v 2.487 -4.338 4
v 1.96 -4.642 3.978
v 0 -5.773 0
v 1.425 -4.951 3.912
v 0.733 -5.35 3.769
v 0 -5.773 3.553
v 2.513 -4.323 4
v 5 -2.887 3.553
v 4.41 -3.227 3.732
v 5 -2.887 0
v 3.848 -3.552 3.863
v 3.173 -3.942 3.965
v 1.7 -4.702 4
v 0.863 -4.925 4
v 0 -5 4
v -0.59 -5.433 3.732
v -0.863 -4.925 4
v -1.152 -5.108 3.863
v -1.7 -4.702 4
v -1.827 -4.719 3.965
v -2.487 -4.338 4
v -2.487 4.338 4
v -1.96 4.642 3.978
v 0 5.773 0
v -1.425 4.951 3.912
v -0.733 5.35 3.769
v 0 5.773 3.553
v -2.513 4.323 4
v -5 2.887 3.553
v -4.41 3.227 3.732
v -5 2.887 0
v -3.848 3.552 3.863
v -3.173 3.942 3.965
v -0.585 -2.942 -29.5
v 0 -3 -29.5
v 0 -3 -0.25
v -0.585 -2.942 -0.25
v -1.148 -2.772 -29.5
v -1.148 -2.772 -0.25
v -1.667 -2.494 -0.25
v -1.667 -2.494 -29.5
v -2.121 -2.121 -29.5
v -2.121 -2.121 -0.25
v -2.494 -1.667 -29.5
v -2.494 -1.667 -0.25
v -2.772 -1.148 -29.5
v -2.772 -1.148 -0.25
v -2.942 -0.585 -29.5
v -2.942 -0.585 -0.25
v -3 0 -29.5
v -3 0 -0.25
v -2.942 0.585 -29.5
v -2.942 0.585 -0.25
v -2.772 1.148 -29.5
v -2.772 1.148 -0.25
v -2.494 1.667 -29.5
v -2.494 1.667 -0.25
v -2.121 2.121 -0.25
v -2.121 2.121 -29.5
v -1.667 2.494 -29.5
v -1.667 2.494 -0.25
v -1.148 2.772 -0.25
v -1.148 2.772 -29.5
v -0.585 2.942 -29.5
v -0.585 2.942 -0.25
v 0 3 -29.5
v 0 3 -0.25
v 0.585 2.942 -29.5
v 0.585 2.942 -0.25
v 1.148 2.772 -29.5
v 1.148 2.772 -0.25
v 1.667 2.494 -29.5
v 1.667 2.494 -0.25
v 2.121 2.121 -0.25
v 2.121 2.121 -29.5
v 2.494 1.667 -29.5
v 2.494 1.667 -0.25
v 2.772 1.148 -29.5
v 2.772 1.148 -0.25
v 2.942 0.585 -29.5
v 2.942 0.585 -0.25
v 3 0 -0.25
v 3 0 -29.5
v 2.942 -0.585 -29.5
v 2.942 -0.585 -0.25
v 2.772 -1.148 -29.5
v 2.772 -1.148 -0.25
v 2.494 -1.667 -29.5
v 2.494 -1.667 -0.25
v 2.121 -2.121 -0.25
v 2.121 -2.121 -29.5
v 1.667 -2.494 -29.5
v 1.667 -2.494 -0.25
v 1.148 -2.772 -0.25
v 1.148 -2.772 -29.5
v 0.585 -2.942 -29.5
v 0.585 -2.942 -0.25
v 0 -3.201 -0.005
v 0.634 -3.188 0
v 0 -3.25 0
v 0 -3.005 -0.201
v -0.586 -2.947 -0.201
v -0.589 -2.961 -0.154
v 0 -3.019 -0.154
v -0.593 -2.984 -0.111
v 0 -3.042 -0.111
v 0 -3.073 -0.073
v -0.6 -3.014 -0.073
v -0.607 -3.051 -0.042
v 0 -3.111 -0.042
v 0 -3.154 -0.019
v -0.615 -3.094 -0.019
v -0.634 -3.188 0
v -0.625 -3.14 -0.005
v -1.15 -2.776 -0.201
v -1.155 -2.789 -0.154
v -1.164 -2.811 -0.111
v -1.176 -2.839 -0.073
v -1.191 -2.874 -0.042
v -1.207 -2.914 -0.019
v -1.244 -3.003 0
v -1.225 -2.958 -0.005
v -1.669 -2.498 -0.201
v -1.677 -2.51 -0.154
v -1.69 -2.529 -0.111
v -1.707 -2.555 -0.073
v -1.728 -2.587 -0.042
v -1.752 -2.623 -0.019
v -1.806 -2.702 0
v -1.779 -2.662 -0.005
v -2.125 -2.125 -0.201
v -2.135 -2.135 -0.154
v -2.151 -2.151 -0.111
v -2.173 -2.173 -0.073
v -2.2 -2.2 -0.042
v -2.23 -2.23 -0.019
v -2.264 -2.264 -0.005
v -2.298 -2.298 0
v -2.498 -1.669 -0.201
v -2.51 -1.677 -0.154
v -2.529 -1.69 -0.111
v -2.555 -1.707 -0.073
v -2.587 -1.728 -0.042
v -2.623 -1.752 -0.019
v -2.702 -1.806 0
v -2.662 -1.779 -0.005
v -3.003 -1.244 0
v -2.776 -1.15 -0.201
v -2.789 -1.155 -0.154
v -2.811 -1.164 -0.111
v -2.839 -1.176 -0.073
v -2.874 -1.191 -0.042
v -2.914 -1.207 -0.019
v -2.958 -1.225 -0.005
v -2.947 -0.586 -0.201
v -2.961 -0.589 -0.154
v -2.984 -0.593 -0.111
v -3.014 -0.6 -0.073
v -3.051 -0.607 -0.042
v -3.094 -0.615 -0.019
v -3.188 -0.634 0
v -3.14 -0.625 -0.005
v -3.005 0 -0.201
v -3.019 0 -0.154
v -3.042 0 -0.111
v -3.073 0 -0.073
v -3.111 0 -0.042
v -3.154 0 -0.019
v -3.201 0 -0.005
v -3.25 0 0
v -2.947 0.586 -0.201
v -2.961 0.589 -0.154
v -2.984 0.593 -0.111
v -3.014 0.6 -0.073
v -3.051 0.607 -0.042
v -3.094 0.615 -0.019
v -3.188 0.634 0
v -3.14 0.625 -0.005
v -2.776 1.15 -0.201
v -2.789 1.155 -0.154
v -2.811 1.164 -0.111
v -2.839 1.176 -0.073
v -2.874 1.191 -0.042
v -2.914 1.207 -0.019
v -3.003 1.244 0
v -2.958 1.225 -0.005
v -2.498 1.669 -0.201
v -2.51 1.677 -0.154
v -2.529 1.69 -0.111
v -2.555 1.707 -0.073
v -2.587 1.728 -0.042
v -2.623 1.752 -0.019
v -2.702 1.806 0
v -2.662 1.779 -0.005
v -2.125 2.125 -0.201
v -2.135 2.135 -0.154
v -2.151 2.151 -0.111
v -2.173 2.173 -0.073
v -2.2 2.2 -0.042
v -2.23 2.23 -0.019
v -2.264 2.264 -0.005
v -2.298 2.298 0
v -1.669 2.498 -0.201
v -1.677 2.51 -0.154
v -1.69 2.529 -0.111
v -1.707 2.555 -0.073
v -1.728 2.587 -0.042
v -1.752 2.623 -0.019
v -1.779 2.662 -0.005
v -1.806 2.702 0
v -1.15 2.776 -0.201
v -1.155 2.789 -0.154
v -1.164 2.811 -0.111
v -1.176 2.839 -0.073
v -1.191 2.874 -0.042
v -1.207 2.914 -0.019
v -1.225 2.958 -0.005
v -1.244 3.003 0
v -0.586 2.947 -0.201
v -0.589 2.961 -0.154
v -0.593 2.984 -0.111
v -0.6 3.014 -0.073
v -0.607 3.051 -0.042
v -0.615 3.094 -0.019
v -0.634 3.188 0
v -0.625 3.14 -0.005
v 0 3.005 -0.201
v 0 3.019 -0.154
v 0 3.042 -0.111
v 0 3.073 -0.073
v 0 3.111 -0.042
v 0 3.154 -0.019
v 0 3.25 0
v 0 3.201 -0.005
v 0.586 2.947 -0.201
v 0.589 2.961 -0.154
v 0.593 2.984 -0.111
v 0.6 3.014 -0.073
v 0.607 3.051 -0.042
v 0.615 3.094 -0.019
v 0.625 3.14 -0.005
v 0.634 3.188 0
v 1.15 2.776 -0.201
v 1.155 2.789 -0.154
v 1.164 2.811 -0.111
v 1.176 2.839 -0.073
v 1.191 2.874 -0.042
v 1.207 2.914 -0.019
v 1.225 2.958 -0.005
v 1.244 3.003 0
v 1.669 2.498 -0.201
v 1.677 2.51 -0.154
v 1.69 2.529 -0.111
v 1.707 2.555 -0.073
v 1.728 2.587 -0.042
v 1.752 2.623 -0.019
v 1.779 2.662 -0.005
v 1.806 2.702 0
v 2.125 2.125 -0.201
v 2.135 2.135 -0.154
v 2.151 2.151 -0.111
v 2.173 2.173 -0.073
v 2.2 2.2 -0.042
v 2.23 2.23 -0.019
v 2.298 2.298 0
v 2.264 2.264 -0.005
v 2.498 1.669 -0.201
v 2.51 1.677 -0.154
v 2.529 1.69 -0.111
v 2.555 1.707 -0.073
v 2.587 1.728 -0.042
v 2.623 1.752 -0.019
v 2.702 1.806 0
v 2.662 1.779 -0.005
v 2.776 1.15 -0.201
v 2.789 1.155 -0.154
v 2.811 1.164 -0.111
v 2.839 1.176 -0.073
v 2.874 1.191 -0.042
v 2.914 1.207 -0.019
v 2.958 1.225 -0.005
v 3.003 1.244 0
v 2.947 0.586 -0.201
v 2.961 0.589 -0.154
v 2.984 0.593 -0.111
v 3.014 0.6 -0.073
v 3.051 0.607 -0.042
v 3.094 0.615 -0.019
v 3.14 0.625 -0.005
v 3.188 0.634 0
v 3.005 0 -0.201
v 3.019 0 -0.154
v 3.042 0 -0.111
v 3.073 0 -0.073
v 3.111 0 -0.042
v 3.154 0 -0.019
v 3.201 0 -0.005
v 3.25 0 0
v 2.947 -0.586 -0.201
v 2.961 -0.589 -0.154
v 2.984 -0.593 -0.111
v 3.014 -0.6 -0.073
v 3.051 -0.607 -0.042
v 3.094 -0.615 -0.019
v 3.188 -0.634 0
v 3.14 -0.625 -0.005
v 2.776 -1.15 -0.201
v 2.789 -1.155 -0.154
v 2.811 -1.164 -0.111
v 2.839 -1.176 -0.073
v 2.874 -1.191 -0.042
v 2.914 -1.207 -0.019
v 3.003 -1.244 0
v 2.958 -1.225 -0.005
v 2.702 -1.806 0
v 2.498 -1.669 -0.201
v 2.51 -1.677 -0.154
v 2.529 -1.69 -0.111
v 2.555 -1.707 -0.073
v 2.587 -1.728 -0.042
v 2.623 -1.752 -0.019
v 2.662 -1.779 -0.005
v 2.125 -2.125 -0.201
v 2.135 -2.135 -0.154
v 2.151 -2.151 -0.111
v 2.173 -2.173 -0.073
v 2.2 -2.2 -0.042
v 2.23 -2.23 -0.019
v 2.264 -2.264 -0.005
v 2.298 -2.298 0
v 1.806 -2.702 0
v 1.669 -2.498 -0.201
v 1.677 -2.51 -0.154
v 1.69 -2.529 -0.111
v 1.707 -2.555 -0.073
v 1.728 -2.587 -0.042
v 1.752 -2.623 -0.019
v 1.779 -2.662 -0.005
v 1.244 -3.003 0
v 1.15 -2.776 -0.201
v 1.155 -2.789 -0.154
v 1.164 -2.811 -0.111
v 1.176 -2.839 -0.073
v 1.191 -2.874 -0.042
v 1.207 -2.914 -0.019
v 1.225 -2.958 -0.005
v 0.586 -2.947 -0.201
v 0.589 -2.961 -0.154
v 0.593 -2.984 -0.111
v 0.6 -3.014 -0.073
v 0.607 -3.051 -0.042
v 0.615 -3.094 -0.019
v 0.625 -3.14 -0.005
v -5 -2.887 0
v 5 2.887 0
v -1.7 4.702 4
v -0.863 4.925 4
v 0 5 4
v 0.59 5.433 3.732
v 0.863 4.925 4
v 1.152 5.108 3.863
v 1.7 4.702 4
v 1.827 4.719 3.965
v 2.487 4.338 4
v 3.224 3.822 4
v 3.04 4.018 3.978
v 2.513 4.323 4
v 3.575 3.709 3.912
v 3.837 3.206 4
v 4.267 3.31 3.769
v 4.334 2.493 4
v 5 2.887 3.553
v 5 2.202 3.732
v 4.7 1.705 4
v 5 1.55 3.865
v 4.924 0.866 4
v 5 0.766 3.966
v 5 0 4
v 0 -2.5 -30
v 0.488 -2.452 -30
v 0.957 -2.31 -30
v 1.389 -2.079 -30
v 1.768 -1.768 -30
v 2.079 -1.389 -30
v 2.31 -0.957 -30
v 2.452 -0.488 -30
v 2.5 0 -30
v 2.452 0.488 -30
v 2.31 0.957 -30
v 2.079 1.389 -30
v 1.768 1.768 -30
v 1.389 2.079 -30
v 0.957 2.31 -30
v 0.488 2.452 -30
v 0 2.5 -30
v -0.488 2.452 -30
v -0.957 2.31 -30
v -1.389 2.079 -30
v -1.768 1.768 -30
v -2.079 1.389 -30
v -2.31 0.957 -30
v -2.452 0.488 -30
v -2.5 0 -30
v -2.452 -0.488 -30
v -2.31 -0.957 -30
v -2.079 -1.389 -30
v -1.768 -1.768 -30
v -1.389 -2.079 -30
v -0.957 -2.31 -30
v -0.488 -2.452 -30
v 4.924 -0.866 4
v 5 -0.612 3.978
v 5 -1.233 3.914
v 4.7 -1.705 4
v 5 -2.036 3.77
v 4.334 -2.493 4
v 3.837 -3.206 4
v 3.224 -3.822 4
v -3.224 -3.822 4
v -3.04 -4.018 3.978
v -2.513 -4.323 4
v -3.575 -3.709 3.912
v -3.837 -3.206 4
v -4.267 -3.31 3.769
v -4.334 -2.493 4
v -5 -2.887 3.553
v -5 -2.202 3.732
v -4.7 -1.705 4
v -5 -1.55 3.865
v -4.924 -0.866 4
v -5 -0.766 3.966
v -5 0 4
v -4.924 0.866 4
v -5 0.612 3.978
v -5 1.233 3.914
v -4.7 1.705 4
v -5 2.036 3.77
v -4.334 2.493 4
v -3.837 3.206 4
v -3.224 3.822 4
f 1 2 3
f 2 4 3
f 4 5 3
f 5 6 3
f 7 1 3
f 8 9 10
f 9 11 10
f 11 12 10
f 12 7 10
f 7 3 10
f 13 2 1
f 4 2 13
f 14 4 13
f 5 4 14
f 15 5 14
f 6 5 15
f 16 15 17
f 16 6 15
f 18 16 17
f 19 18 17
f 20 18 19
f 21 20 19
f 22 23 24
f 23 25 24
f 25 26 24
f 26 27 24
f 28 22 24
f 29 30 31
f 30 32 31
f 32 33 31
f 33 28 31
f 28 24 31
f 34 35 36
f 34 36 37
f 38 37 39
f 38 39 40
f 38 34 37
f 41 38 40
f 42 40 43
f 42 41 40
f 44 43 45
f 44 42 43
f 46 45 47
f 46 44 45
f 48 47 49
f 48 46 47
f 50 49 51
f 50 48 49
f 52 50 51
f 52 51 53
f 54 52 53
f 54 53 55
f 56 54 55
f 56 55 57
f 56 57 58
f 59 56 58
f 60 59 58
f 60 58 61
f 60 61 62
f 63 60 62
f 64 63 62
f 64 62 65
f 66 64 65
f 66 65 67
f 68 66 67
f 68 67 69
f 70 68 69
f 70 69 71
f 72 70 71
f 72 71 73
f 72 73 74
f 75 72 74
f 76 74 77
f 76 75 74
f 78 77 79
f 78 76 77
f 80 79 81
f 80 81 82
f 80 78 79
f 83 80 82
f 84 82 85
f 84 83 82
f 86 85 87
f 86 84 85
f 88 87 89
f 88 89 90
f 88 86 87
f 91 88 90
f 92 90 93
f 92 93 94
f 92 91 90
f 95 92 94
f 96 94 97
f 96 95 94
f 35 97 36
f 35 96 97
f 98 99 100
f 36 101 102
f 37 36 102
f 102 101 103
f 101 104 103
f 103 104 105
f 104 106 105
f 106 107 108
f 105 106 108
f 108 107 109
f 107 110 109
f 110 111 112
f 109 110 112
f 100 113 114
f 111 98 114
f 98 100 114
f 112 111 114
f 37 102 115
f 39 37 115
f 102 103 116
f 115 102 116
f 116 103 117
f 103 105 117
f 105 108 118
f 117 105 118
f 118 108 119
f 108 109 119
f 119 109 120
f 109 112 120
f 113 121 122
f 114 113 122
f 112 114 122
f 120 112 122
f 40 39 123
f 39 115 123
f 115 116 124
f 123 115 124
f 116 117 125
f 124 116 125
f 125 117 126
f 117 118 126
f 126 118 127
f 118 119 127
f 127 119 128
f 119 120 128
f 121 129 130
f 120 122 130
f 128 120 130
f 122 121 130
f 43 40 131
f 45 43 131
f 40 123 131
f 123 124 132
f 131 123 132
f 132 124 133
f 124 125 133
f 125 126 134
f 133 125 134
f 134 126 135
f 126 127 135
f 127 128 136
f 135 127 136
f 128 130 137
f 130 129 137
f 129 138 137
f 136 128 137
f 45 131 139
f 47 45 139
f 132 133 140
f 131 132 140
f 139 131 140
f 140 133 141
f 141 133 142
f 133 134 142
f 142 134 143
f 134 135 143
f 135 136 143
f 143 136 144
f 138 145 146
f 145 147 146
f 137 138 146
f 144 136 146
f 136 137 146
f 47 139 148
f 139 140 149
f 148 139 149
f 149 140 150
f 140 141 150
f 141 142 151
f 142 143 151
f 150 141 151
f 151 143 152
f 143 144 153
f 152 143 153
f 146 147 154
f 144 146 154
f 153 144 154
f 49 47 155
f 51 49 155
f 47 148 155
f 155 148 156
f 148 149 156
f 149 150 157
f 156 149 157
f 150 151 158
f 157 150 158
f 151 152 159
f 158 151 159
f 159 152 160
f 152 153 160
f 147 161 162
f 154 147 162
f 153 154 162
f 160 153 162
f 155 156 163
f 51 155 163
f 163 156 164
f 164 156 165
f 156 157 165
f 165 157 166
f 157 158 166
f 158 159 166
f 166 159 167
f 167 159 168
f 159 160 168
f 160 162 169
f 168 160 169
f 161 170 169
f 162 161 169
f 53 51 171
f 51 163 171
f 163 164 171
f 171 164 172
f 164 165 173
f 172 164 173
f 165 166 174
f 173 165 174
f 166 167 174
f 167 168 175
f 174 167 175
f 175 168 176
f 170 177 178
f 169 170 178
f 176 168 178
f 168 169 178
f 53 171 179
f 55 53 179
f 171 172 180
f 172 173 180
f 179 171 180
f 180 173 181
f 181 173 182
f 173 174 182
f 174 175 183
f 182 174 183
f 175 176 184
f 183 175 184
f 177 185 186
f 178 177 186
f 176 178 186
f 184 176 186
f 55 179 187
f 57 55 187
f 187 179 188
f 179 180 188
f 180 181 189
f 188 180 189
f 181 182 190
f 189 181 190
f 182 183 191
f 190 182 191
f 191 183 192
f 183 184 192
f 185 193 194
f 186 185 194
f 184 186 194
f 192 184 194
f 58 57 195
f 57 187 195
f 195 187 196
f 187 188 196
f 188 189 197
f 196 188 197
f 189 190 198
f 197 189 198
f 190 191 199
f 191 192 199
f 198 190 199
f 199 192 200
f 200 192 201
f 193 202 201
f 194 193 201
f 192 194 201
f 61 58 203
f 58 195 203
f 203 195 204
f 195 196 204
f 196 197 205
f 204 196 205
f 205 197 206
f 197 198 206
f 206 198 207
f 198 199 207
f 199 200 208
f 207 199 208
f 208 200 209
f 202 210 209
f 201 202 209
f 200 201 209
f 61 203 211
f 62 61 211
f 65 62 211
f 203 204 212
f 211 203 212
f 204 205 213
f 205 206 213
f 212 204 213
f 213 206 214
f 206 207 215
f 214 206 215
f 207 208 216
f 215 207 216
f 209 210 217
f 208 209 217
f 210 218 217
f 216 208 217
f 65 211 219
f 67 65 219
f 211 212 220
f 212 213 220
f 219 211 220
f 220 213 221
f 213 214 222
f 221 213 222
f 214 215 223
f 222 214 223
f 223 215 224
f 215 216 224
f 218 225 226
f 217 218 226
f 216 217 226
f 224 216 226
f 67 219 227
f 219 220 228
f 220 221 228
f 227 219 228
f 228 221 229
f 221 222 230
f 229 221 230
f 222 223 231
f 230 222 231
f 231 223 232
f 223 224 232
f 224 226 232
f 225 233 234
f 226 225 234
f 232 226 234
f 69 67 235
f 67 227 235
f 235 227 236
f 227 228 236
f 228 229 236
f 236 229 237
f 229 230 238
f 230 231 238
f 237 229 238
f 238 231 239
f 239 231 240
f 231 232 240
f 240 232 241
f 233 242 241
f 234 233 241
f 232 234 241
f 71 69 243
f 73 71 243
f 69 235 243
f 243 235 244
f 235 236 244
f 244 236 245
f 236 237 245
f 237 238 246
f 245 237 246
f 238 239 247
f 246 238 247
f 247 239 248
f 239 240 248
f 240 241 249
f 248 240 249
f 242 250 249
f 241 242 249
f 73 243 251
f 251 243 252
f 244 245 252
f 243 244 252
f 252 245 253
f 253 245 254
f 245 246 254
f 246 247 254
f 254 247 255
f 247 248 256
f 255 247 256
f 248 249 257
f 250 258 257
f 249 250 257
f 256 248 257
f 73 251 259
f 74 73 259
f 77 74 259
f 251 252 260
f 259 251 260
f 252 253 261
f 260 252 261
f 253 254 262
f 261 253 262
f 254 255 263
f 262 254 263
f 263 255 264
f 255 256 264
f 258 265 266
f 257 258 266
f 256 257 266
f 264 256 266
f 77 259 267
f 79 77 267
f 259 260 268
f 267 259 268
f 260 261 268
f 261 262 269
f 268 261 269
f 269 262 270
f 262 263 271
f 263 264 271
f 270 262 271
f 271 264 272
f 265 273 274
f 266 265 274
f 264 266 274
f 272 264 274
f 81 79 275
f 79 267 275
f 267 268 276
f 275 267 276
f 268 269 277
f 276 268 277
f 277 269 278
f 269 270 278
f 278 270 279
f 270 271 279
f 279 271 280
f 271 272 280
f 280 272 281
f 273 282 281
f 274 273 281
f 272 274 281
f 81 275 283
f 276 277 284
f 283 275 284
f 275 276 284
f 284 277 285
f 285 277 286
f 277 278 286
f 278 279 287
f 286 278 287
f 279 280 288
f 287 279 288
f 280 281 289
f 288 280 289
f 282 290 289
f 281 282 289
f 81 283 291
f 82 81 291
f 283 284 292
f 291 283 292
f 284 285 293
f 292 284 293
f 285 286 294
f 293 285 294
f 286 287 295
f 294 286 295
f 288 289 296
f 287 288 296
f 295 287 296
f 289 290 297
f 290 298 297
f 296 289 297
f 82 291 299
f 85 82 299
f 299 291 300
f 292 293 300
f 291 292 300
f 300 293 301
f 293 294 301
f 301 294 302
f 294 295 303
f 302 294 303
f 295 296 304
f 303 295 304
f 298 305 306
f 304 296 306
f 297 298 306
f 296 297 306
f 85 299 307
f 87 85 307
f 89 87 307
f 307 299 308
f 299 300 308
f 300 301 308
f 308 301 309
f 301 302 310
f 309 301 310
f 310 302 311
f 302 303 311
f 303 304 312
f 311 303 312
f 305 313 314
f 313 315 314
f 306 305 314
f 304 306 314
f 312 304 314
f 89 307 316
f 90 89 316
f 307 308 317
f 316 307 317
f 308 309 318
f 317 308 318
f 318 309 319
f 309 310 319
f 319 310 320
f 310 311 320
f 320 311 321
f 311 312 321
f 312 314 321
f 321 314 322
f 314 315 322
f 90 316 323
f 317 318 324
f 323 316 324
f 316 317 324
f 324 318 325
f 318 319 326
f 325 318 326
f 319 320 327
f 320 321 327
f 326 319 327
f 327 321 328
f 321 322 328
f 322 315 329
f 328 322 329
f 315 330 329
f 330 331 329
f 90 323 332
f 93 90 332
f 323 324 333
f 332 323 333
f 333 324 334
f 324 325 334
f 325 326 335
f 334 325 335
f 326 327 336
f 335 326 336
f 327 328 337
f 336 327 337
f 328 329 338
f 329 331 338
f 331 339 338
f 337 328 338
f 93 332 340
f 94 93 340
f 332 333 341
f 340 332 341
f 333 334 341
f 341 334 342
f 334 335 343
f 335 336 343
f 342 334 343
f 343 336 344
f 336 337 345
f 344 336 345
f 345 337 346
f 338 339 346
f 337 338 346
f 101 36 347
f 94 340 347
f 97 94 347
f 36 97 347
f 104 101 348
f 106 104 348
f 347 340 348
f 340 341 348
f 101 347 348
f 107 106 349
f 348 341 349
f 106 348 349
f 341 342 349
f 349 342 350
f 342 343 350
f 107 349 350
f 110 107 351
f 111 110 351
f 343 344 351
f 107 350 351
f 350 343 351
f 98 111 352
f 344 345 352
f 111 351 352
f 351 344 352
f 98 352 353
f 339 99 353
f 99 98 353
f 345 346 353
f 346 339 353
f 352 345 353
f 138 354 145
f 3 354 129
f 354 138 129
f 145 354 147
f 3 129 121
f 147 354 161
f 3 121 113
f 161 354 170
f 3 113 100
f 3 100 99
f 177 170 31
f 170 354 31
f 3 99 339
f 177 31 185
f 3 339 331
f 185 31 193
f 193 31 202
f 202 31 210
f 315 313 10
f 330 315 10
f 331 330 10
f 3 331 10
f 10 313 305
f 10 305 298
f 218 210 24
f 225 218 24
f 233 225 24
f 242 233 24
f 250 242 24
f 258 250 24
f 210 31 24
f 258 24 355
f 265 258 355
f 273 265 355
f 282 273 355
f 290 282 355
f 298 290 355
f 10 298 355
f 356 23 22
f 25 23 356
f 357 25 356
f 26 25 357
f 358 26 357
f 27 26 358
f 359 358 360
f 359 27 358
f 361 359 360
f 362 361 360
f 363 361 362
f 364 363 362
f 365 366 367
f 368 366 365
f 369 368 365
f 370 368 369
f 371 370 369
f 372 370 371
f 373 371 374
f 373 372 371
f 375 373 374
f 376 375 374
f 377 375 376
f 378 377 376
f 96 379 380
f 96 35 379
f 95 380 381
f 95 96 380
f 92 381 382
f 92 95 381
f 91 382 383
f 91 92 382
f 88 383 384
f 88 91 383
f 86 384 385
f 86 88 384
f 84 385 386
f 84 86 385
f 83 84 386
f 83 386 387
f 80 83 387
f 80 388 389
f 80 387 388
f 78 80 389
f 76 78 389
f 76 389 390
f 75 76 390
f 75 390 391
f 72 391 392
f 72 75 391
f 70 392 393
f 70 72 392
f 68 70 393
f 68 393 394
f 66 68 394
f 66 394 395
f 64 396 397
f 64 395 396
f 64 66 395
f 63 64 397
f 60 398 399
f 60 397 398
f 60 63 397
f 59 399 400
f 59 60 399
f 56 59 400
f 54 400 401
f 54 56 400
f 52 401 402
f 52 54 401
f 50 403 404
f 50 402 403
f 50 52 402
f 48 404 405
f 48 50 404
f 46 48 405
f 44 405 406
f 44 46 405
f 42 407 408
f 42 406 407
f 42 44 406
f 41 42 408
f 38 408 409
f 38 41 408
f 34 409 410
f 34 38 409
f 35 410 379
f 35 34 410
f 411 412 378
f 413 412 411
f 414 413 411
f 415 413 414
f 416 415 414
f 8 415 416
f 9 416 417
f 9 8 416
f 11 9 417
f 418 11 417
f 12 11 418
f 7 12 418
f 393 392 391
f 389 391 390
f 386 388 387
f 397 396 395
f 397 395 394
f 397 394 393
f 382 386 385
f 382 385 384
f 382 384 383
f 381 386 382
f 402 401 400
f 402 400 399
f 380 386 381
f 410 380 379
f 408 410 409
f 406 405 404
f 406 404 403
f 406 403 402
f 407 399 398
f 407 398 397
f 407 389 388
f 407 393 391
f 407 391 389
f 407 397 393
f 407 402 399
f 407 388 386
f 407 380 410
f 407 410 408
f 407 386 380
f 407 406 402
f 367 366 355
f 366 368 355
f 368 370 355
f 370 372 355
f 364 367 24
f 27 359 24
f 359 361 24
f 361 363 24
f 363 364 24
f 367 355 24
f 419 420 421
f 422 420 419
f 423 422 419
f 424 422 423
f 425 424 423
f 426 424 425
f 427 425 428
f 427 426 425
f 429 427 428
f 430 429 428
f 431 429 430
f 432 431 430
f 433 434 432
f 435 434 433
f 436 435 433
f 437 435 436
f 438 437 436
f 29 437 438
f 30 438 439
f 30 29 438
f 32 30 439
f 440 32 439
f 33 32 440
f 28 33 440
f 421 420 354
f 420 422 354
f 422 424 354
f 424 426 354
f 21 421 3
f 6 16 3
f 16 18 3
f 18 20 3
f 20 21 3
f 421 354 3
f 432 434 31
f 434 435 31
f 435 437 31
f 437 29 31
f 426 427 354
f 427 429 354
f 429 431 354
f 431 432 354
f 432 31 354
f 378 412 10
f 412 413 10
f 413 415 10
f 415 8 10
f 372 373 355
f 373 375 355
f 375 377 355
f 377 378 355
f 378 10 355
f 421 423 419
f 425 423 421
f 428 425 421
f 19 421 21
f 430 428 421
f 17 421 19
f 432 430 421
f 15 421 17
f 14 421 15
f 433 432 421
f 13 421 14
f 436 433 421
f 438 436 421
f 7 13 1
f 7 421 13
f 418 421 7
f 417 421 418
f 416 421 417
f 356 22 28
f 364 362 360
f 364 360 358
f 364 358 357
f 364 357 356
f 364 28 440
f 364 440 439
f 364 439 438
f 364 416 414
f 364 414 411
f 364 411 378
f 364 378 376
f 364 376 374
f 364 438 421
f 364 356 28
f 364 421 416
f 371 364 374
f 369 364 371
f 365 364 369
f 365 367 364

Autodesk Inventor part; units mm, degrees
ref_plane "WorkPlane1" through (0, 0, 0) normal (0, 0, 1) x (1, 0, 0)
sketch "Sketch1" plane through (0, 0, 0) normal (0, 0, 1) x (1, 0, 0)
  point P0 (0, 0)
sketch "Sketch2" plane through (0, 0, 0) normal (0, 0, 1) x (1, 0, 0)
  line L0 (-5, 2.8868) -> (-5, -2.8868)
  line L1 (0, 5.7734) -> (-5, 2.8868)
  line L2 (5, 2.8868) -> (0, 5.7734)
  line L3 (5, -2.8868) -> (5, 2.8868)
  line L4 (0, -5.7734) -> (5, -2.8868)
  line L5 (-5, -2.8868) -> (0, -5.7734)
  circle A0 centre (0, 0) radius 5 construction
  dimension "d1" = 10
  dimension "d29" = 0
  dimension "d30" = 0
extrude "Extrusion1" add sketch "Sketch2" along normal blind 4
sketch "Sketch3" plane through (0, 0, 0) normal (1, 0, 0) x (0, 1, 0)
  line L0 (5, 4) -> (5.8734, 4)
  line L1 (5.8734, 3.4957) -> (5, 4)
  line L2 (5.8734, 4) -> (5.8734, 3.4957)
  line L3 (0, -0.8) -> (0, 4.8) projected
  line L4 (5.7734, 0) -> (5.7734, 4) projected
  dimension "d25" = 0.1
  dimension "d26" = 0
  dimension "d27" = 60
  dimension "d28" = 5
revolve "Revolution1" cut sketch "Sketch3" angle 360 about axis through (0, 0, -10) along (0, 0, 1)
sketch "Sketch4" plane through (0, 0, 0) normal (1, 0, 0) x (0, 1, 0)
  line L0 (0, -30) -> (0, 0)
  line L1 (-3, -30) -> (0, -30)
  line L2 (-3, 0) -> (-3, -30)
  line L3 (0, 0) -> (-3, 0)
  line L4 (0, -30) -> (0, 0)
  line L5 (-3.6, 0) -> (0.6, 0) projected
  line L6 (0, -36) -> (0, 6) projected
  dimension "d18" = 3
  dimension "d20" = 30
  dimension "d33" = 0
  dimension "d34" = 0
revolve "Revolution2" add sketch "Sketch4" angle 360 about axis through (0, 0, -30) along (0, 0, -1)
chamfer "Chamfer1" distance 0.5 angle 45 1 edges at (0, 3, -30)
fillet "Fillet1" radius 0.25 1 edges at (0, 3, 0)
thread "Thread1" size "M6x1" class "6g" standard "ISO Metric profile" length 18
ref_plane "MSC_PF1" through (0, 0, 0) normal (1, 0, 0) x (0, 1, 0)
ref_plane "MSC_PT1" through (0, 0, 0) normal (0, 0, -1) x (-1, 0, 0)
equation "\"d22\" = 0.5 * PTC"
equation "\"d23\" = 0.5 * PTC"
equation "\"d24\" = r"
equation "\"d1\" = ParS"
equation "\"d6\" = ParK"
equation "\"d28\" = 0.5 * ParS"
equation "\"d18\" = 0.5 * NND"
equation "\"d20\" = NLG"
equation "\"NND\" = 6"
equation "\"NLG\" = 30"
equation "\"PTC\" = 1"
equation "\"ParK\" = 4"
equation "\"ParS\" = 10"
equation "\"msp_es\" = 0.577367 * ParS"
equation "\"r\" = 0.25"
equation "\"THREADDIA\" = NND"
properties part number "ISO 4016 - M6 x 30" material "Steel"
